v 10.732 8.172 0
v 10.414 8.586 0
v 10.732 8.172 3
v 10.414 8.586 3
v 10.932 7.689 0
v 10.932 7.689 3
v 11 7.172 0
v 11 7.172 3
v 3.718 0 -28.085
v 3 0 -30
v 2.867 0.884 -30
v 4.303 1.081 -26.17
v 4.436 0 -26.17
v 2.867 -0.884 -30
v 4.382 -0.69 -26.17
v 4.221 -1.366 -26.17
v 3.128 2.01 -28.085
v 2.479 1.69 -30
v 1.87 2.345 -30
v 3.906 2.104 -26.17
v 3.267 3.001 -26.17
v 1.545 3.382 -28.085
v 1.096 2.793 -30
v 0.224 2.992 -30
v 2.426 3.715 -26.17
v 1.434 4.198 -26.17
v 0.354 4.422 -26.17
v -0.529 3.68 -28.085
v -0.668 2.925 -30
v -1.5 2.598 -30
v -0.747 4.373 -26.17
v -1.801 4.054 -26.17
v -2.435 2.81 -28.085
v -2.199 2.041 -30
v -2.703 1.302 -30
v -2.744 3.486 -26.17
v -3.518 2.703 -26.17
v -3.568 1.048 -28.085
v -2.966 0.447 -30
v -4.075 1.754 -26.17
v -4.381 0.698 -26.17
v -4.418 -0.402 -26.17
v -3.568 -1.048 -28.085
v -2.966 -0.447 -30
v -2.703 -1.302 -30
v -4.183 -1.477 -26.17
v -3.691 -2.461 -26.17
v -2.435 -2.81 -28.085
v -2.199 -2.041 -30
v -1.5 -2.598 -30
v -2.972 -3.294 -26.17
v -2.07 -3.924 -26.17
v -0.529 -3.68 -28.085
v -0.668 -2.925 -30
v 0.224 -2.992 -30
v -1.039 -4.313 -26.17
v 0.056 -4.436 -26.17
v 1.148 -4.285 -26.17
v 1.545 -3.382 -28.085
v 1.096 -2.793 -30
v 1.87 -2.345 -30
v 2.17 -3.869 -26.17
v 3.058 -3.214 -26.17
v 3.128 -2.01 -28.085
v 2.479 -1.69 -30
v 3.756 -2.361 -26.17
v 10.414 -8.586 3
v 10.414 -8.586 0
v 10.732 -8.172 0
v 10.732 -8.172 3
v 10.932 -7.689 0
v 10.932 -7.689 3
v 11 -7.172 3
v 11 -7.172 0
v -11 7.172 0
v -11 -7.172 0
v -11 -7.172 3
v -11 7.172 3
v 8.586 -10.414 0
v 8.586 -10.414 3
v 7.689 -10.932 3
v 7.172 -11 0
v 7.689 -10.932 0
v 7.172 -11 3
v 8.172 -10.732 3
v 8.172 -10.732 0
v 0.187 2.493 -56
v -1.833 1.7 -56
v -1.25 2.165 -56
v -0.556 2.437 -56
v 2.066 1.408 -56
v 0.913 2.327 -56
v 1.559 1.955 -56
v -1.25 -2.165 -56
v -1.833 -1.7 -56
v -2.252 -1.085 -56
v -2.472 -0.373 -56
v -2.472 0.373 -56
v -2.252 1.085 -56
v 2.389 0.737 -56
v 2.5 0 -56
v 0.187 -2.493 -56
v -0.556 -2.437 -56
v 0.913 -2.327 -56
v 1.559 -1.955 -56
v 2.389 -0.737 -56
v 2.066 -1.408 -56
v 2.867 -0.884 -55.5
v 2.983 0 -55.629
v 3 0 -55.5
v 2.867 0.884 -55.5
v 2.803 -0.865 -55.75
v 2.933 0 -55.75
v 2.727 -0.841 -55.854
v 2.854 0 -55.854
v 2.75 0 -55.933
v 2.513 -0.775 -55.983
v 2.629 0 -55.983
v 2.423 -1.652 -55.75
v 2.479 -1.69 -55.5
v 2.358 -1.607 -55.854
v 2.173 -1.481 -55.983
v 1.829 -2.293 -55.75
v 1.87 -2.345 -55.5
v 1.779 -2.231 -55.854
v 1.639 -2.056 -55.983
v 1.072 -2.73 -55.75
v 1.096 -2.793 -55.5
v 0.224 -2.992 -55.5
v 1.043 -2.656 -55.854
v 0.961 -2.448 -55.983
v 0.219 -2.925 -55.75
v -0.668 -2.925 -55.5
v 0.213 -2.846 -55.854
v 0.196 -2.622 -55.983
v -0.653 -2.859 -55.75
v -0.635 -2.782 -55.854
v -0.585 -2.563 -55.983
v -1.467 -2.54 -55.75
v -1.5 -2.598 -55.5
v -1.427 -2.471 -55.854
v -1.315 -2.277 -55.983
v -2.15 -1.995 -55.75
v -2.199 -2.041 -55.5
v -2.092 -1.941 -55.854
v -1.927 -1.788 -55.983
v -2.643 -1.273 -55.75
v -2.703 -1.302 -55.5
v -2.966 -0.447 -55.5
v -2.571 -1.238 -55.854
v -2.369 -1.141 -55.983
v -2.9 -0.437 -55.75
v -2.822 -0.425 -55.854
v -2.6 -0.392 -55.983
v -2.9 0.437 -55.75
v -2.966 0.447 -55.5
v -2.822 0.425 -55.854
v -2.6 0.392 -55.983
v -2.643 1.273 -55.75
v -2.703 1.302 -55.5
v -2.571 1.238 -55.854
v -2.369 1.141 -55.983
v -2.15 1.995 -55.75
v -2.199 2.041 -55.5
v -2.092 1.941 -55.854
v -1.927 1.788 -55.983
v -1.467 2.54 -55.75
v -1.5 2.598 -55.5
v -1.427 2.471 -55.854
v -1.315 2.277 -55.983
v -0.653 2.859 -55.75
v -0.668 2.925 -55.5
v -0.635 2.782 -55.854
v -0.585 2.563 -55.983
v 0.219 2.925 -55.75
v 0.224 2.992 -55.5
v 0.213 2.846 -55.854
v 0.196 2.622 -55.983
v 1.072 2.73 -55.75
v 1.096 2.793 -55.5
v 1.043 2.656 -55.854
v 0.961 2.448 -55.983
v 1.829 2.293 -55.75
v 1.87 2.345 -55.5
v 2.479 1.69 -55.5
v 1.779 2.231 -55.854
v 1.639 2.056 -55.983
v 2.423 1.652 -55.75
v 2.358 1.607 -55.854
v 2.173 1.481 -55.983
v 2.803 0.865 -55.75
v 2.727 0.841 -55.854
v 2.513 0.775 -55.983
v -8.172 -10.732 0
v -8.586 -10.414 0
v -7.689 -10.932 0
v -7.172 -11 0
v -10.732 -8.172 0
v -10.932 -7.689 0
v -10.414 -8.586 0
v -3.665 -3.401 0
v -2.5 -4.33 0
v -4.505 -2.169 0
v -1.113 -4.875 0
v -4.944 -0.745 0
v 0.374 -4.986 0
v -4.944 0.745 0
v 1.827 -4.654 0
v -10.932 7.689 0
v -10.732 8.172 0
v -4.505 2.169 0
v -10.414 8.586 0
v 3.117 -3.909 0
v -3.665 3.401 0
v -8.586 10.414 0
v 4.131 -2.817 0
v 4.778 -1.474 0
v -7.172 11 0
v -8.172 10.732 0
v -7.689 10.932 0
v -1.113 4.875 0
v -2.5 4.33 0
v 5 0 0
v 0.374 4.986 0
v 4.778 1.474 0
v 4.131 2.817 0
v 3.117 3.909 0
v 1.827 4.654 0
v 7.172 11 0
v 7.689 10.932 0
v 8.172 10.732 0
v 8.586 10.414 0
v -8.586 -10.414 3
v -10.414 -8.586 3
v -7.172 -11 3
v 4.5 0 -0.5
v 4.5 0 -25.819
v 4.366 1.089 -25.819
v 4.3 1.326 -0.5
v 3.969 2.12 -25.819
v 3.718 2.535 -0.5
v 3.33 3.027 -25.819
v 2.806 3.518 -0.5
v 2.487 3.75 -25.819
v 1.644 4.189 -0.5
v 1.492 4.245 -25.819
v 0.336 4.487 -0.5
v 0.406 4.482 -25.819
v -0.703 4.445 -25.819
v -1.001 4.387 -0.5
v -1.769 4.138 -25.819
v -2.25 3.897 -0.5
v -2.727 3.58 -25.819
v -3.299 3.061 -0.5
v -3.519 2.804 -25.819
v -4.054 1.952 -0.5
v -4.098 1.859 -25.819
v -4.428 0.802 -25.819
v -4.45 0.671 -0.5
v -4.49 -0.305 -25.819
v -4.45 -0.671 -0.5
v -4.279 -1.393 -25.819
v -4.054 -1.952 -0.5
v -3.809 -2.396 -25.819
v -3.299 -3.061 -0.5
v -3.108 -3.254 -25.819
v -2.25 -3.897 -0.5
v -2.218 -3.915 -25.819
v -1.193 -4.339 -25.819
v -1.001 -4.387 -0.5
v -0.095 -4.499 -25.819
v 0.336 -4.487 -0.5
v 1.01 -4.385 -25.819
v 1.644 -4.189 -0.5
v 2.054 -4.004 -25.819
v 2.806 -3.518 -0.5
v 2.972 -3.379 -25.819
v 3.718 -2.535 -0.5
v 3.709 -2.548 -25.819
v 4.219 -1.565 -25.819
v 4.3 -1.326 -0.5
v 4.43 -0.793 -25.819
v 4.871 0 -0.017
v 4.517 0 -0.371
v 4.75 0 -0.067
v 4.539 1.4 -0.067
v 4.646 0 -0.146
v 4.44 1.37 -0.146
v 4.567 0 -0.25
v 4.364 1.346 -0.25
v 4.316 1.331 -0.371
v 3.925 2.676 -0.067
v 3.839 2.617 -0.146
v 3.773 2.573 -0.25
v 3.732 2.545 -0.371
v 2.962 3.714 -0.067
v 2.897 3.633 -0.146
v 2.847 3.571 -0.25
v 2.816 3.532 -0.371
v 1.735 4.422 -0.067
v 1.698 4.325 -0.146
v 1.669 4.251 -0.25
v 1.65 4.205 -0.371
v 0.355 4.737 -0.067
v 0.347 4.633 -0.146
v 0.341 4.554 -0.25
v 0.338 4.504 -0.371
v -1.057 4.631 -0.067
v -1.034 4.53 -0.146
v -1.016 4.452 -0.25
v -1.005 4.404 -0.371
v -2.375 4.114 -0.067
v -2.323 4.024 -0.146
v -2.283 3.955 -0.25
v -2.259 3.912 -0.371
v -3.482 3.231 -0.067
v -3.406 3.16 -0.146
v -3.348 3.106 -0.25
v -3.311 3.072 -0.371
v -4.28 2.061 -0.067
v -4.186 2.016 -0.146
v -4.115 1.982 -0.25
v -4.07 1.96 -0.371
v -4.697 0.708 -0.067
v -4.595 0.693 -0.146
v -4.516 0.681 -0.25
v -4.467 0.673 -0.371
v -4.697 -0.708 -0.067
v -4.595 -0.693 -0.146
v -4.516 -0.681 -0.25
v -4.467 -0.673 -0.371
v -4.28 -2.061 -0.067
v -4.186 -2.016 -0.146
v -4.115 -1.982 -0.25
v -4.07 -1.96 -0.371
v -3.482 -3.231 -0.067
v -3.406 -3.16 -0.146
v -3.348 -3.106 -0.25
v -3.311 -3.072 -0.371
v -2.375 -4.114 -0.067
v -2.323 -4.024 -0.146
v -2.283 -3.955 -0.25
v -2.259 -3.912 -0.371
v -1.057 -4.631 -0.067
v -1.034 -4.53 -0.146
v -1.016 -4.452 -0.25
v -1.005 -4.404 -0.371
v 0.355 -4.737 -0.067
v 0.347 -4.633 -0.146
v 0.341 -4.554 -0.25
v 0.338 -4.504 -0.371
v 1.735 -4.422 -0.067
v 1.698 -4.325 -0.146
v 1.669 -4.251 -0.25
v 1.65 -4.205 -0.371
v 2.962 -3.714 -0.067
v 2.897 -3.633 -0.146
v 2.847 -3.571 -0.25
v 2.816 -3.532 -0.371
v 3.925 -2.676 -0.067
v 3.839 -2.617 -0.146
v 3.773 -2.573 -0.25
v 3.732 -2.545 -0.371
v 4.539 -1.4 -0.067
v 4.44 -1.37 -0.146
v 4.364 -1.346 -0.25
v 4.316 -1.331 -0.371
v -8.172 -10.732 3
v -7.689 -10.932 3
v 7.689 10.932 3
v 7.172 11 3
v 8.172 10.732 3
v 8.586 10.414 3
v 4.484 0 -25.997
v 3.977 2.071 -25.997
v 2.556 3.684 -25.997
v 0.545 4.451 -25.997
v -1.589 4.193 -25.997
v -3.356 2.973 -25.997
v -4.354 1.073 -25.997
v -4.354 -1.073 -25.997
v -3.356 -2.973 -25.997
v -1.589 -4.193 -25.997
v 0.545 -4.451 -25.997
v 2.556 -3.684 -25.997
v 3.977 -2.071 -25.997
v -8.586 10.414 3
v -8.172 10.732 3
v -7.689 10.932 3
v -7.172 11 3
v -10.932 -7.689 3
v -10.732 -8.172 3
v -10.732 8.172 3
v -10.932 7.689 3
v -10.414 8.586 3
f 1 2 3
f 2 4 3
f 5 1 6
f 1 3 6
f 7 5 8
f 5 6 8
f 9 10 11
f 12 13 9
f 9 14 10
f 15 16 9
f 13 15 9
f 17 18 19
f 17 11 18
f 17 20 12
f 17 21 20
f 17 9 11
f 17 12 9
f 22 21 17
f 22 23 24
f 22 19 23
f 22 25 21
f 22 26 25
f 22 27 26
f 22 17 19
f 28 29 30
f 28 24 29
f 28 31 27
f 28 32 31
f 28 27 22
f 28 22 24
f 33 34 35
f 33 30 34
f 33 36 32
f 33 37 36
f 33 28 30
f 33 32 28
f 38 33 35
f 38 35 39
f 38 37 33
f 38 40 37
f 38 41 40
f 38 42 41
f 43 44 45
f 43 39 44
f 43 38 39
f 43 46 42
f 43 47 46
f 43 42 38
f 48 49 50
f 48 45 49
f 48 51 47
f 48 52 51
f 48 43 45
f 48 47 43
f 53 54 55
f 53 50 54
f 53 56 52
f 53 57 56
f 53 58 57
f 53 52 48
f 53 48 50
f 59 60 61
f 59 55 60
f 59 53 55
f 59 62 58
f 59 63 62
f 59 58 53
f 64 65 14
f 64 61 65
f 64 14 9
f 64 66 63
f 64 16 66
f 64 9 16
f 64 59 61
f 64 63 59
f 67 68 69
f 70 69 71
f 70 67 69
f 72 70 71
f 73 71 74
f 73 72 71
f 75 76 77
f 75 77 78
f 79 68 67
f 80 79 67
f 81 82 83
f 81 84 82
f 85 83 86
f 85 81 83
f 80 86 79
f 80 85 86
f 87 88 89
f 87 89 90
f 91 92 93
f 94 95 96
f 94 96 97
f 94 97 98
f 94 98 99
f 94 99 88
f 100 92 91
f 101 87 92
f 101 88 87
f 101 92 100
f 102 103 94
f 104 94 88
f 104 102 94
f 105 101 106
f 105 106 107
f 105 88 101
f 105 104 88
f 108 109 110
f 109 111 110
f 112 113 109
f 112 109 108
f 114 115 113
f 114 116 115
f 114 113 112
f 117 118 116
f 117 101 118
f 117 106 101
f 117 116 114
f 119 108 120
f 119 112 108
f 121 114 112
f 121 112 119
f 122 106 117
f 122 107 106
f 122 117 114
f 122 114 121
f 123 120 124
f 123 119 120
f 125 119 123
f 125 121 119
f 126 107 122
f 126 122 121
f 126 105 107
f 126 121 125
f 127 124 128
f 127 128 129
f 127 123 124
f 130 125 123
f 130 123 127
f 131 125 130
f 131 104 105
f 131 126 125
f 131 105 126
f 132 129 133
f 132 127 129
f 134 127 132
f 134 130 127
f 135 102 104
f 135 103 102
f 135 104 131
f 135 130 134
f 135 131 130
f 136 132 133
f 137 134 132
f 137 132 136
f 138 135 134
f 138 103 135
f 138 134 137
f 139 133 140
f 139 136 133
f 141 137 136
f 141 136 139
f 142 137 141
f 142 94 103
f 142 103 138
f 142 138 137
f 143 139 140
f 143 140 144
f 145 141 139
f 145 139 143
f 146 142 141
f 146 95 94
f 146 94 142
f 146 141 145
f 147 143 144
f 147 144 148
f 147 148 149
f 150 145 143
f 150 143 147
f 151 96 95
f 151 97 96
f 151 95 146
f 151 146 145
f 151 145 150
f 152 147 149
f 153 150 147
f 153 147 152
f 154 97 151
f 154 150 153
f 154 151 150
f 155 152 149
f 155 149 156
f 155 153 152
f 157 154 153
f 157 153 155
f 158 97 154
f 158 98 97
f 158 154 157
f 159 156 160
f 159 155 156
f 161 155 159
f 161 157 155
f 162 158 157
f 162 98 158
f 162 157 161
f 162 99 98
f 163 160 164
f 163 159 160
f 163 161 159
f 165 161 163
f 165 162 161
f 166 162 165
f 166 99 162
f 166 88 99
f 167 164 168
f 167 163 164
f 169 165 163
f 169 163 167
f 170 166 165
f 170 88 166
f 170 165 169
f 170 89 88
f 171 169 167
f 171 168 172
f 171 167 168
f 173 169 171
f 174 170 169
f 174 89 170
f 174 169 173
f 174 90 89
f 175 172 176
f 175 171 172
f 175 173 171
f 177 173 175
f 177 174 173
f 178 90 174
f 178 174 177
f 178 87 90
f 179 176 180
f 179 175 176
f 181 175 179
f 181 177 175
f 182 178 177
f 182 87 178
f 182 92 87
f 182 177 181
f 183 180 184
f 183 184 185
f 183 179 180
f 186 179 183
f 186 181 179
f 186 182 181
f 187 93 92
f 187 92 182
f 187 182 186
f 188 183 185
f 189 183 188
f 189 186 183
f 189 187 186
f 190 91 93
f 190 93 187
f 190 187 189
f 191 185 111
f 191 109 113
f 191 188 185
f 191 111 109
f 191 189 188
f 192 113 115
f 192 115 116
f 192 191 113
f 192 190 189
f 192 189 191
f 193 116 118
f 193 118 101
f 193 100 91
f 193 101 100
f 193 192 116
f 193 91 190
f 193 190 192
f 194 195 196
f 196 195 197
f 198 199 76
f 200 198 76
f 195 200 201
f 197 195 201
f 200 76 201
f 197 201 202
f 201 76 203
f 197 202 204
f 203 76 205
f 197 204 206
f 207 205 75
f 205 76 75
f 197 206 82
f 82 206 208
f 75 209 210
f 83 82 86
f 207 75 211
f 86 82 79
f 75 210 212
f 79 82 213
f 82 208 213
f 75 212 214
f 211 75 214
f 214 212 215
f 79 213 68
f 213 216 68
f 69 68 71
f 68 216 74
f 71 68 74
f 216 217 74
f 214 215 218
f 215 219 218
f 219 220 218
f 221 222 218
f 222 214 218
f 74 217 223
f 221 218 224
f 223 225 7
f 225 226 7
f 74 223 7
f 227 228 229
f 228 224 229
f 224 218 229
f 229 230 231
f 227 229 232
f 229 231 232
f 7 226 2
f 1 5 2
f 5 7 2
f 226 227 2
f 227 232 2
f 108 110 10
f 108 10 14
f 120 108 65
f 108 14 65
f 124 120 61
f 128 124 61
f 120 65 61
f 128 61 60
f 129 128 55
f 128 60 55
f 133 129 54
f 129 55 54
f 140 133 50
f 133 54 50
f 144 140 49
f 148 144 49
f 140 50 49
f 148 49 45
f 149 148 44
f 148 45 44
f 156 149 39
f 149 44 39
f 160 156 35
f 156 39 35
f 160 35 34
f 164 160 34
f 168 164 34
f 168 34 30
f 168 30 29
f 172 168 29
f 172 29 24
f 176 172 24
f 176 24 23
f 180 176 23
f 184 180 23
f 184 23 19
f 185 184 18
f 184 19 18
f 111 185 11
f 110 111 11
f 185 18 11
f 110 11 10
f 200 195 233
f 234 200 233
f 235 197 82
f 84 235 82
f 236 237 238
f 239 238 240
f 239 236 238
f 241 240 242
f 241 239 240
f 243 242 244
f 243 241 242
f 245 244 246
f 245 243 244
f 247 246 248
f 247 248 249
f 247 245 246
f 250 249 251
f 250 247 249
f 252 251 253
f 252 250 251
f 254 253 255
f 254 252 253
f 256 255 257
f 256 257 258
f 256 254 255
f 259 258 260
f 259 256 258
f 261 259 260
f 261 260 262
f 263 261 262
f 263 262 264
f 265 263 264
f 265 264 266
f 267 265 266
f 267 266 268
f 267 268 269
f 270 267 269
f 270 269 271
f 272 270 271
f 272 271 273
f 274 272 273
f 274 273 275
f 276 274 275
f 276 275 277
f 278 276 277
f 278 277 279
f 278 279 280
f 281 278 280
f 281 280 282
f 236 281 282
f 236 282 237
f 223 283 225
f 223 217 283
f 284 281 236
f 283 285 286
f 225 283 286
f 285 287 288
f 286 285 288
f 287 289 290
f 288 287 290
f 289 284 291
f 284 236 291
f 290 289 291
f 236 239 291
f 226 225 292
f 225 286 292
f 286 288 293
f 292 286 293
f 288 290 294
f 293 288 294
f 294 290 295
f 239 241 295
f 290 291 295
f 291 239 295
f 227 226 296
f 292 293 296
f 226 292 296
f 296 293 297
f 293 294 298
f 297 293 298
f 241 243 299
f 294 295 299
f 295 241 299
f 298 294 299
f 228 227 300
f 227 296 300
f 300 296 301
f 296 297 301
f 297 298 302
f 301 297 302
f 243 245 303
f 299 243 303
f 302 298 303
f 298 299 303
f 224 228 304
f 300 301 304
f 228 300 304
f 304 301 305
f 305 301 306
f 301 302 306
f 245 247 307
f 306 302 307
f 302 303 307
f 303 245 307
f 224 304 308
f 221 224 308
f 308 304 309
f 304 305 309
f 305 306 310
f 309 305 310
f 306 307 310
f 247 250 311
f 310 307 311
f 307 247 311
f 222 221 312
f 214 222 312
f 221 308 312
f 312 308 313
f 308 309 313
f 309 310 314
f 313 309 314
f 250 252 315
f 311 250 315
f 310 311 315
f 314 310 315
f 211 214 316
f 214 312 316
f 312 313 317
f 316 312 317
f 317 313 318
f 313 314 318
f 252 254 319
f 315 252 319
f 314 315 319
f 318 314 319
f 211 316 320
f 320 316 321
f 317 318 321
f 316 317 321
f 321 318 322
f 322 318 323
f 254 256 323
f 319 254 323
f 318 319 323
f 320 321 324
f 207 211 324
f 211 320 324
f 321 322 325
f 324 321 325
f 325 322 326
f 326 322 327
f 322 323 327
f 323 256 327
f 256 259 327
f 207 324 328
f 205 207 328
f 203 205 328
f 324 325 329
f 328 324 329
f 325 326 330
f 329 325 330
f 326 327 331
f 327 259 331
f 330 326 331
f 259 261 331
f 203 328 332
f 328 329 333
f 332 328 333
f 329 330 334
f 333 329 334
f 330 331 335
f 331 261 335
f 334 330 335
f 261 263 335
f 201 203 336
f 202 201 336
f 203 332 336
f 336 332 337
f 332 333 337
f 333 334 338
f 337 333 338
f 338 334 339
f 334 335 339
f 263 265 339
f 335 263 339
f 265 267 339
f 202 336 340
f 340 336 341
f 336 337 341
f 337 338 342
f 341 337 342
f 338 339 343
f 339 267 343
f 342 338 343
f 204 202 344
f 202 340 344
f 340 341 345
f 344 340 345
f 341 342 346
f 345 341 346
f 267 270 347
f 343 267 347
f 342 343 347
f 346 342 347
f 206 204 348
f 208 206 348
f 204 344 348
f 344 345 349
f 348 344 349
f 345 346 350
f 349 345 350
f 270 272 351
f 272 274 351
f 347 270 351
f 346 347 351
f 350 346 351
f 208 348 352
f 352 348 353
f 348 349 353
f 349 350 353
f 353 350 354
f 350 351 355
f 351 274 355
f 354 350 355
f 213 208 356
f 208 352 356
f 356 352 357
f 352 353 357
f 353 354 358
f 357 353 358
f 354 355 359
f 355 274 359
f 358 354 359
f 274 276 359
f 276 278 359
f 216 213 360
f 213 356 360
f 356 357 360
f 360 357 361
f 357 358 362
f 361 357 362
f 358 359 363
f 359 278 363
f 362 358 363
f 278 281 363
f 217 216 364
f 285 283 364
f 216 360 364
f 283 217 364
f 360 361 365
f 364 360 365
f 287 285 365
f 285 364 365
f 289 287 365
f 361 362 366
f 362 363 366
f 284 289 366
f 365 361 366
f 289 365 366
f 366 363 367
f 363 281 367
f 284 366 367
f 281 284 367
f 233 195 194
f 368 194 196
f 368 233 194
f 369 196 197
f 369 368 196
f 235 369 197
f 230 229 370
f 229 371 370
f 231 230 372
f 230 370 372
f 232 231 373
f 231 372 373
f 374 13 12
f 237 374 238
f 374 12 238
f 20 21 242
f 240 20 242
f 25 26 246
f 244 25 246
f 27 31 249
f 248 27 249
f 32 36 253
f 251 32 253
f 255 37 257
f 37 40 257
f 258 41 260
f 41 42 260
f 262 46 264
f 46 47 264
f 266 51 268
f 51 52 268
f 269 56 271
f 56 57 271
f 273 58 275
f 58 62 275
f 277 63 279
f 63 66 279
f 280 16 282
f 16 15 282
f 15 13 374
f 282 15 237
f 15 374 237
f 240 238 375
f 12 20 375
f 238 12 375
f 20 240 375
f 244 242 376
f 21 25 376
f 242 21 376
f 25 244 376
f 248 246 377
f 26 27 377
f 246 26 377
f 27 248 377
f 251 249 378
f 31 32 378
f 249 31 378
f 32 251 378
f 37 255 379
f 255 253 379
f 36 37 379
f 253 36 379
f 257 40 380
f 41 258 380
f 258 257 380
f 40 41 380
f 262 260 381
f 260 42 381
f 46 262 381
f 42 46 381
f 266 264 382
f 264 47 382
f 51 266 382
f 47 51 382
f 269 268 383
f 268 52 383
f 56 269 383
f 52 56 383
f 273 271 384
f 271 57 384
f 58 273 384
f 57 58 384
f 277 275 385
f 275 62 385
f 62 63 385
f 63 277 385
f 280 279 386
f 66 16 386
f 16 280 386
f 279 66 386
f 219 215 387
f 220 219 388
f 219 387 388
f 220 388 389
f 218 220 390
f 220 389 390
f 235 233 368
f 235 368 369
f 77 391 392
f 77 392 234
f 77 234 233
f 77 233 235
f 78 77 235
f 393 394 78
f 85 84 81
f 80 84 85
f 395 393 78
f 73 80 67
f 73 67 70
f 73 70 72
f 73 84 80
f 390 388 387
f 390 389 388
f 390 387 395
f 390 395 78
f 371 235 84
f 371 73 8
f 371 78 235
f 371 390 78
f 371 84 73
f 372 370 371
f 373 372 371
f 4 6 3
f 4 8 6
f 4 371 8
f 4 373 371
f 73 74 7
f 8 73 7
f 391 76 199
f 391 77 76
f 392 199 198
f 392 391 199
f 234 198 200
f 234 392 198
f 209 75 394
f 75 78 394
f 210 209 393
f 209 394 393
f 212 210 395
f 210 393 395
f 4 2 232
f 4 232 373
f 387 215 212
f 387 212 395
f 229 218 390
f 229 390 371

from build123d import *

# Parameters (mm, degrees)
SKETCH1_W           = 22
SKETCH1_H           = 22
BOSS_EXTRUDE1_DEPTH = 3
SKETCH1_3_R         = 4.5
BOSS_EXTRUDE2_DEPTH = 30
SKETCH2_R           = 3
BOSS_EXTRUDE3_DEPTH = 26
FILLET1_R           = 0.5
FILLET4_R           = 0.5
FILLET5_R           = 1
CHAMFER2_SIZE       = 3
FILLET7_R           = 2


with BuildPart() as part:
    # Sketch1 → Boss-Extrude1 (new body)
    with BuildSketch(Plane.XY):
        Rectangle(SKETCH1_W, SKETCH1_H)
    extrude(amount=BOSS_EXTRUDE1_DEPTH)

    # Sketch1<3> → Boss-Extrude2 (add)
    with BuildSketch(Plane.XY):
        Circle(SKETCH1_3_R)
    extrude(amount=-BOSS_EXTRUDE2_DEPTH)

    # Sketch2 → Boss-Extrude3 (add)
    with BuildSketch(Plane(origin=(0, 0, -30), x_dir=(-1, 0, 0), z_dir=(0, 0, -1))):
        Circle(SKETCH2_R)
    extrude(amount=BOSS_EXTRUDE3_DEPTH)

    # Sketch3 → Cut-Revolve1 (revolve, cut)
    with BuildSketch(Plane(origin=(0, 0, 0), x_dir=(0, 0, -1), z_dir=(1, 0, 0))):
        Polygon((30, 3), (26, 4.5), (30, 4.5), align=None)
    revolve(axis=Axis((0, 0, -30), (0, 0, 1)), mode=Mode.SUBTRACT)

    # Fillet1
    fillet1_edges = [part.edges().sort_by_distance(p)[0] for p in [
        (-4.5, 0, 0),
    ]]
    fillet(fillet1_edges, radius=FILLET1_R)

    # Fillet4
    fillet4_edges = [part.edges().sort_by_distance(p)[0] for p in [
        (3, 0, -56),
    ]]
    fillet(fillet4_edges, radius=FILLET4_R)

    # Fillet5
    fillet5_edges = [part.edges().sort_by_distance(p)[0] for p in [
        (-3.181980515, -3.181980515, -26),
    ]]
    fillet(fillet5_edges, radius=FILLET5_R)

    # Chamfer2
    chamfer2_edges = [part.edges().sort_by_distance(p)[0] for p in [
        (11, 11, 1.5),
        (-11, 11, 1.5),
        (-11, -11, 1.5),
        (11, -11, 1.5),
    ]]
    chamfer(chamfer2_edges, length=CHAMFER2_SIZE)

    # Fillet7
    fillet7_edges = [part.edges().sort_by_distance(p)[0] for p in [
        (8, -11, 1.5),
        (11, -8, 1.5),
        (-11, -8, 1.5),
        (-8, -11, 1.5),
        (-11, 8, 1.5),
        (-8, 11, 1.5),
        (11, 8, 1.5),
        (8, 11, 1.5),
    ]]
    fillet(fillet7_edges, radius=FILLET7_R)


solid = part.part
